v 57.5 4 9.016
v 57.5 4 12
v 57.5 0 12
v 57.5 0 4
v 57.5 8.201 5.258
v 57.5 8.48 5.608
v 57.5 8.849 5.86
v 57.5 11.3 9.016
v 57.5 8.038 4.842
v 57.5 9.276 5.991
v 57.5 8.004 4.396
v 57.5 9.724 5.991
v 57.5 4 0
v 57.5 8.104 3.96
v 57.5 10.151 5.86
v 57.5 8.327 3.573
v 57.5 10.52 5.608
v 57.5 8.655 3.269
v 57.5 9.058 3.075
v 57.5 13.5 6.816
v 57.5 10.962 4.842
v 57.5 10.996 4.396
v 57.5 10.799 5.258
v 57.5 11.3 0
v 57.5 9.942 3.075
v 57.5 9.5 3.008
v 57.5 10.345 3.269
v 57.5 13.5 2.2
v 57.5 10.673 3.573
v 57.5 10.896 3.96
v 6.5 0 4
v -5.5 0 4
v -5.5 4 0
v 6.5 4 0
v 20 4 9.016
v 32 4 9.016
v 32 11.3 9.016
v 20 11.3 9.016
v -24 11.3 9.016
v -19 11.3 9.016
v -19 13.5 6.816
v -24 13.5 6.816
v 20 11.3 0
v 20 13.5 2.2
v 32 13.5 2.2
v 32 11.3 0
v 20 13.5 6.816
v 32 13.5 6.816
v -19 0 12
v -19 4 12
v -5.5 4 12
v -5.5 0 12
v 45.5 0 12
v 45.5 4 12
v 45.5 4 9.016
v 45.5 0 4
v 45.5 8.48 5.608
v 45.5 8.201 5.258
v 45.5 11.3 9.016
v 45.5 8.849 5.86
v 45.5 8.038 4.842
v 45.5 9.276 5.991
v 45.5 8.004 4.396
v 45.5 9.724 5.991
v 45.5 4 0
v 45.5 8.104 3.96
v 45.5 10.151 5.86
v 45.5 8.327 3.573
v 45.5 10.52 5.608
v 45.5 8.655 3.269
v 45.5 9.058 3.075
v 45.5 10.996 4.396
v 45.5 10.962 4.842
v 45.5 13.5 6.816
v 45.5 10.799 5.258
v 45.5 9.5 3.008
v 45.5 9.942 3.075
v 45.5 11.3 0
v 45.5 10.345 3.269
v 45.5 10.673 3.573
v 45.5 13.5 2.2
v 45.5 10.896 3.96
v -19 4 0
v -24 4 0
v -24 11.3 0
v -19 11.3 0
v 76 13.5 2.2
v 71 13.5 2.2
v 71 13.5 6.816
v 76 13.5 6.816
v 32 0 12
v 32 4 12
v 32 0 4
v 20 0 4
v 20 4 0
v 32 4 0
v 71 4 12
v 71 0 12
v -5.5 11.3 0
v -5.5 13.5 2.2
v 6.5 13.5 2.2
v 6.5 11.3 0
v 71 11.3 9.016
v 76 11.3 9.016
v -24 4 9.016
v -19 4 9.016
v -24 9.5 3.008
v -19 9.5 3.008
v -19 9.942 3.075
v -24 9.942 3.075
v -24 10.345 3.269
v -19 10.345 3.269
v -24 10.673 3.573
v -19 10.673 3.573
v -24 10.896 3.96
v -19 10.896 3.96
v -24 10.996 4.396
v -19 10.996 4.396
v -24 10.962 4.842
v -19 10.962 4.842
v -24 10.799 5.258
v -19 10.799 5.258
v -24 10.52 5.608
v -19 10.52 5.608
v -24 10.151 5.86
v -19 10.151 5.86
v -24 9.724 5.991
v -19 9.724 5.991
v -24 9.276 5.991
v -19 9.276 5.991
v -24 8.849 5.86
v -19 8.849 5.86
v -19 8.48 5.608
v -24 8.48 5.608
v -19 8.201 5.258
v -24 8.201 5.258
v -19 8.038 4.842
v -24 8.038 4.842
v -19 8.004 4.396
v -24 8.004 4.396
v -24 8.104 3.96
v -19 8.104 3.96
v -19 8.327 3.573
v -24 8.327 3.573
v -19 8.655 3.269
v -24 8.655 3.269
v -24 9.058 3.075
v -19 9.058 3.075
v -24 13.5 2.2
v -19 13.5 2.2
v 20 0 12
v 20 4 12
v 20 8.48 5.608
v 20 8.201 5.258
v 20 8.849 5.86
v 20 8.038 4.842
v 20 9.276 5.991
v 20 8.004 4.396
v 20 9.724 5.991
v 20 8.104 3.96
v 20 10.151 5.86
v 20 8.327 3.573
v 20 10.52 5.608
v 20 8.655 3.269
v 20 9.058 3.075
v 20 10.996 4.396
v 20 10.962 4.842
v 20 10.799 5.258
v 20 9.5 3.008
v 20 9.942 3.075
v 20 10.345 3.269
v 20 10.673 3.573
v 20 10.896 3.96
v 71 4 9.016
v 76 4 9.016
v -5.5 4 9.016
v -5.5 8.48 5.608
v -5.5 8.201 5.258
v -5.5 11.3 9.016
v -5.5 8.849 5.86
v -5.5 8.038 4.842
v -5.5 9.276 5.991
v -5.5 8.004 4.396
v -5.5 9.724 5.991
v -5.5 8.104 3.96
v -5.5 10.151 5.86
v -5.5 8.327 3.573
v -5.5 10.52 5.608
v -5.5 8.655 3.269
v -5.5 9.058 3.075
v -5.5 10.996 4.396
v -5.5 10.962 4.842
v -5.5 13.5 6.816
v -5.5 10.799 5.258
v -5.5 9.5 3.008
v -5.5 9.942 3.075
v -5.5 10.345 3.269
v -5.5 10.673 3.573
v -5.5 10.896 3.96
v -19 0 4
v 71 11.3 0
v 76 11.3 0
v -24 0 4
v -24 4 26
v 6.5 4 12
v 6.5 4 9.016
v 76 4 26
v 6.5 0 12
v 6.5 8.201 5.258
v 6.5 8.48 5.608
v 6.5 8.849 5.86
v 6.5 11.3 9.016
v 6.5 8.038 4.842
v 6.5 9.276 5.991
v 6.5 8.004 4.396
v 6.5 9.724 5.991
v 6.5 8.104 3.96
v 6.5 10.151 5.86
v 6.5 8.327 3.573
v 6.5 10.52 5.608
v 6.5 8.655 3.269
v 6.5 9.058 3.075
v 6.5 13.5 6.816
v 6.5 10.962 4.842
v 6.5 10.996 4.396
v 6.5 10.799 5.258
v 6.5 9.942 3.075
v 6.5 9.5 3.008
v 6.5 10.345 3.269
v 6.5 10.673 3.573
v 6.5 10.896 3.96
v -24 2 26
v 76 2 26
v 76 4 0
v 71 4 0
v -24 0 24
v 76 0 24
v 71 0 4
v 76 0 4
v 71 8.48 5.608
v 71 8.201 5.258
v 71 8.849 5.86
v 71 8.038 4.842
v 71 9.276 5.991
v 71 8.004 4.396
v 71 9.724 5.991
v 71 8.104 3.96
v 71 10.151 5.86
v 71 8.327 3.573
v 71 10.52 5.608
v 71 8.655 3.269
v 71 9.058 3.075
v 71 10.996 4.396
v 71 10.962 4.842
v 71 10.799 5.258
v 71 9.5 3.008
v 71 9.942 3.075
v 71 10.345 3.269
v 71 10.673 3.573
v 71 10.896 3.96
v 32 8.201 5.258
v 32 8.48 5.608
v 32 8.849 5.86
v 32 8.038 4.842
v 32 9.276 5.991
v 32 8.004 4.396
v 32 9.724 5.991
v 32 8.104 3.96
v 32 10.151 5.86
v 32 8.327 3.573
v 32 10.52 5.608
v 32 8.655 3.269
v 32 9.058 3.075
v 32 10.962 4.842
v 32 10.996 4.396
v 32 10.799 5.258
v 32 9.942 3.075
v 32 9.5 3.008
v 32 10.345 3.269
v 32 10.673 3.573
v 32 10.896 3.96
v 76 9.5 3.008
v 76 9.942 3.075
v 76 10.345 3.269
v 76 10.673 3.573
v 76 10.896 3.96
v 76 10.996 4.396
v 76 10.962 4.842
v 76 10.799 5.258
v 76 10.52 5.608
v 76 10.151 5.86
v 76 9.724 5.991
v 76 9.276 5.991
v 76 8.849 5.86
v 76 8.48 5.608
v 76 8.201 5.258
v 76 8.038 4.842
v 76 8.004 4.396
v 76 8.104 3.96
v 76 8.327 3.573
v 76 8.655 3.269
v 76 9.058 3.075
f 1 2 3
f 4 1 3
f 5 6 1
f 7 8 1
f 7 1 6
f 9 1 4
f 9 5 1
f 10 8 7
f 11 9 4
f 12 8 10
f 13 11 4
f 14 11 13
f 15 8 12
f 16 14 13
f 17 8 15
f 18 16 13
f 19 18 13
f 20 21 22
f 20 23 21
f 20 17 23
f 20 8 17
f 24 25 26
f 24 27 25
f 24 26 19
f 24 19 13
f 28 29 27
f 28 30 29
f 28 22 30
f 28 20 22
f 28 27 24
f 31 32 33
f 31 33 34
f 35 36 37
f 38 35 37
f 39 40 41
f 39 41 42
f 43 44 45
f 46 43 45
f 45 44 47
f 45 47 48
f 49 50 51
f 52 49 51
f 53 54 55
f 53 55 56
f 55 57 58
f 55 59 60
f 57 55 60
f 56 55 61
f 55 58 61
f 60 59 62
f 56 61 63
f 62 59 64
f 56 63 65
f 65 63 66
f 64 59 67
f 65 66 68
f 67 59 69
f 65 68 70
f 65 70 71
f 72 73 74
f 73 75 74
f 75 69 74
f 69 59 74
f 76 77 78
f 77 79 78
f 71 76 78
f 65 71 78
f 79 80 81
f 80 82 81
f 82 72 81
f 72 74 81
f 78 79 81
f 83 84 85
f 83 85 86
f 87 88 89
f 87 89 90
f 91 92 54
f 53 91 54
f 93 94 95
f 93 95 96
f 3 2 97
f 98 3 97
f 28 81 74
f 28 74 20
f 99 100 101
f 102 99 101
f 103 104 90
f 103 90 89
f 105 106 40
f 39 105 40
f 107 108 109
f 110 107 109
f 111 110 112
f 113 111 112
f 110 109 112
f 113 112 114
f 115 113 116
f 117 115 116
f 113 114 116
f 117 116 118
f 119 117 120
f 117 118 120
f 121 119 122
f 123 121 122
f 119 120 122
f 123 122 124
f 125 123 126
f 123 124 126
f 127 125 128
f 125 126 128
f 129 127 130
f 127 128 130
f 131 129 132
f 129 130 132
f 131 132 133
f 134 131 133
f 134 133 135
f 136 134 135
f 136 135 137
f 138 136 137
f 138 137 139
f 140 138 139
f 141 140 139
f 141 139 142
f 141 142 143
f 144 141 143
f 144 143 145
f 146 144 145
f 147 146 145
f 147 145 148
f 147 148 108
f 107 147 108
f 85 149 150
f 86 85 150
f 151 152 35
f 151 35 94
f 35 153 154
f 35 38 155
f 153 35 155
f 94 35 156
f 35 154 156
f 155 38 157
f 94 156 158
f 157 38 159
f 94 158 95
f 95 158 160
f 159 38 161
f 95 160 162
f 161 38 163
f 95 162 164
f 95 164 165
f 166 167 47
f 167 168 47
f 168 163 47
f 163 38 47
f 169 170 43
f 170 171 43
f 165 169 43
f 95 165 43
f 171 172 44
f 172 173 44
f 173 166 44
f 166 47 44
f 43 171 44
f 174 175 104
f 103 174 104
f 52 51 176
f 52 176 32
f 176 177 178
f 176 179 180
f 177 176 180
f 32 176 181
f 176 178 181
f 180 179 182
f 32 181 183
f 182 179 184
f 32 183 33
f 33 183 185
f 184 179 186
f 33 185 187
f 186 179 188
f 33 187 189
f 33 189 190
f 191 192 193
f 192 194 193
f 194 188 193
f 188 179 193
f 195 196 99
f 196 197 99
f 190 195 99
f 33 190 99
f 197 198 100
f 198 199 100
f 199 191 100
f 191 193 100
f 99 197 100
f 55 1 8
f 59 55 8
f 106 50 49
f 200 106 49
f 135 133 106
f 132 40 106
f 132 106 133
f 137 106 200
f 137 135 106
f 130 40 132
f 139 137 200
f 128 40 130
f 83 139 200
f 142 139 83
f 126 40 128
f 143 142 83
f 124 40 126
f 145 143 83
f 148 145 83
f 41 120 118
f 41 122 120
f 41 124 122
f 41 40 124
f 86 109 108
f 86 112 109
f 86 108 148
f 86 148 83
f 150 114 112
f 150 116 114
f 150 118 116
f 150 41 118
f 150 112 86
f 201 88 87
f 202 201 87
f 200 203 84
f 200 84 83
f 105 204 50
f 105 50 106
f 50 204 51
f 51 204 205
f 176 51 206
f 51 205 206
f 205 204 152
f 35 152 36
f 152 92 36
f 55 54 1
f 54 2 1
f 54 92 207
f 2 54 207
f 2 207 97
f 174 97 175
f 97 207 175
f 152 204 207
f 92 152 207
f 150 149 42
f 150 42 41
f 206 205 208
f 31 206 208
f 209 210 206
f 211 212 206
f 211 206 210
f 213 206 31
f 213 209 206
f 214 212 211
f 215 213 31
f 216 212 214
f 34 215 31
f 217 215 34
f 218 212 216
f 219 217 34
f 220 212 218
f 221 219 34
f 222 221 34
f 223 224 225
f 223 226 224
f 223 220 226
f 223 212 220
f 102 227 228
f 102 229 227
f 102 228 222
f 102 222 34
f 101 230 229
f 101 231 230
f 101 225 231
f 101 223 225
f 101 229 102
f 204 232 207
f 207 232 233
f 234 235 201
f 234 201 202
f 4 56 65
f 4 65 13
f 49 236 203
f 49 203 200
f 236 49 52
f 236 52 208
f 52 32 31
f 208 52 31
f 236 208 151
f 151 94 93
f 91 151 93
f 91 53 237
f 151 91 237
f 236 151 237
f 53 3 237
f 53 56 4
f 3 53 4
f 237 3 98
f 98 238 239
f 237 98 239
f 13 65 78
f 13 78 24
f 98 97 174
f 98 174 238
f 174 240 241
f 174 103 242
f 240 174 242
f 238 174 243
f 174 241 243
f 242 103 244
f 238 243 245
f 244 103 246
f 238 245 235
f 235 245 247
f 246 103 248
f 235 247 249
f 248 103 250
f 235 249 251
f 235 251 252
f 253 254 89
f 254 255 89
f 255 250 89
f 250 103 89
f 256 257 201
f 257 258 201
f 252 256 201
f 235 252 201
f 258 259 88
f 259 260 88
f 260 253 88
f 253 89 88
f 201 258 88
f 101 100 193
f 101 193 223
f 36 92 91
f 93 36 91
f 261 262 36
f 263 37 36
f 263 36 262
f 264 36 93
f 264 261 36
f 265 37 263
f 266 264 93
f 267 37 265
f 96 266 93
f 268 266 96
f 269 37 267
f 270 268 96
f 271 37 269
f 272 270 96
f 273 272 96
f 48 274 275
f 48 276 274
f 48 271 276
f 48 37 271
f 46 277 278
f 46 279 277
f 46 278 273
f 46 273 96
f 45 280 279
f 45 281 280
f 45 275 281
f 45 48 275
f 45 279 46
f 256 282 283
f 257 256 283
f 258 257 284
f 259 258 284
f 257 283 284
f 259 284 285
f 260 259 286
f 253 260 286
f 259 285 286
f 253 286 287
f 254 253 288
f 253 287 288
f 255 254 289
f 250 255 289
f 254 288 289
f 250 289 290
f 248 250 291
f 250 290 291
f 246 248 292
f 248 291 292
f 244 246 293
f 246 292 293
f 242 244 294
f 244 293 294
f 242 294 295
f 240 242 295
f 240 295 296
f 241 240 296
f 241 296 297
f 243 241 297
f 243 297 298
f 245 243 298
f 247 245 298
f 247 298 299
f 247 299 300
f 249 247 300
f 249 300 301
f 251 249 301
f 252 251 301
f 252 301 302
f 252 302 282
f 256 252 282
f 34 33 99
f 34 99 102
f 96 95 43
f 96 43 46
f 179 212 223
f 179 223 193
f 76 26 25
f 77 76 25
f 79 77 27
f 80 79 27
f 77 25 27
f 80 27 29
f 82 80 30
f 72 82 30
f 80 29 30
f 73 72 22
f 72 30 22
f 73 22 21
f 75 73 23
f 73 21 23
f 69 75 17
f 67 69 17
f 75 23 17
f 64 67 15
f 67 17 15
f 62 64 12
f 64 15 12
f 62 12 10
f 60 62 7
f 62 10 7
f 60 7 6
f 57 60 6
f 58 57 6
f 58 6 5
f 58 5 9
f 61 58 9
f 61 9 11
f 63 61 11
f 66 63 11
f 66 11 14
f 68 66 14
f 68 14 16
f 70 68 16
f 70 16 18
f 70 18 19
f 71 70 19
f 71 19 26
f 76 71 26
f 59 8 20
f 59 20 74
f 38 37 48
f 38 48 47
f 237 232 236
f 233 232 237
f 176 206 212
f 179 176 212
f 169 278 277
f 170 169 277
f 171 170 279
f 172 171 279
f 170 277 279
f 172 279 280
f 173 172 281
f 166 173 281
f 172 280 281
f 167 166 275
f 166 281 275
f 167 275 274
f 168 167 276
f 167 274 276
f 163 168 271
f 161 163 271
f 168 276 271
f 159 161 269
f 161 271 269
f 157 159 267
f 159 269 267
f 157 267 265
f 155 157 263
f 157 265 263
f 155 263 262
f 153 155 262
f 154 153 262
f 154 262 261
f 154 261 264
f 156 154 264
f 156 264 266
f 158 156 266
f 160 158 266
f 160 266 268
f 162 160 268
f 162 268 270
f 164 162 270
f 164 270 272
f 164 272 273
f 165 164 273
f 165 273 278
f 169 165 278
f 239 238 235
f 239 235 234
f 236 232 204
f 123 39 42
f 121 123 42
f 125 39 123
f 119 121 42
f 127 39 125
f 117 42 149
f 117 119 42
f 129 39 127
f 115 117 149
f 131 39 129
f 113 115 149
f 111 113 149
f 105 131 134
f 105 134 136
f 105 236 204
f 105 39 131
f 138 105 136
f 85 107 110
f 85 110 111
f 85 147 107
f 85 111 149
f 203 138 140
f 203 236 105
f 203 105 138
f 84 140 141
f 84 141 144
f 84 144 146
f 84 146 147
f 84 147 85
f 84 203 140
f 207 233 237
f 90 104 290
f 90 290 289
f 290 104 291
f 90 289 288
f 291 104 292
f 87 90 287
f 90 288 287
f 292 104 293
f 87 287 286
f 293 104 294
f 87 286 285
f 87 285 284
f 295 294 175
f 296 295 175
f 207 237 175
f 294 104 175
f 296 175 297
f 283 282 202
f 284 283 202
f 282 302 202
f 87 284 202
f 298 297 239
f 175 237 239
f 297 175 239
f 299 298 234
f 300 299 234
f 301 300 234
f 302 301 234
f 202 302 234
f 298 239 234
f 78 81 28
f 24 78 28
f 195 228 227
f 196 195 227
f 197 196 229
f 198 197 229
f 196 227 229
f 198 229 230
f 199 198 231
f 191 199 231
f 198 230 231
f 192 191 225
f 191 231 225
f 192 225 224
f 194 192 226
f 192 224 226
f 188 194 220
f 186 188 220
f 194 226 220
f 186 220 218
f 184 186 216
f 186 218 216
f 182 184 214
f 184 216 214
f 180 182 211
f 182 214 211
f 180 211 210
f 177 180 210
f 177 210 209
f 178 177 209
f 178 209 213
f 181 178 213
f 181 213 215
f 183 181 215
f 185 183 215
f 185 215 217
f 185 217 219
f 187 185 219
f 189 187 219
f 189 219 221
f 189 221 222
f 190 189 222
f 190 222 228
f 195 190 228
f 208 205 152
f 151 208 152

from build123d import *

# Parameters (mm, degrees)
SKETCH_1_W          = 100
SKETCH_1_H          = 26
EXTRUDE_1_DEPTH     = 13.5
SKETCH_2_W          = 19.106704299
SKETCH_2_H          = 9.5
CUT_EXTRUDE_1_DEPTH = 105.202927022
CHAMFER_1_SIZE      = 2.2
CHAMFER_2_SIZE      = 4
SKETCH_3_R          = 1.5
CUT_EXTRUDE_2_DEPTH = 105.202927022
SKETCH_4_W          = 13.5
SKETCH_4_H          = 12
CUT_EXTRUDE_3_DEPTH = 82.450905458
CHAMFER_3_SIZE      = 2


with BuildPart() as part:
    # Эскиз1 → Вытянуть1 (new body)
    with BuildSketch(Plane(origin=(0, 0, 0), x_dir=(1, 0, 0), z_dir=(0, 1, 0))):
        with Locations((26, -13)):
            Rectangle(SKETCH_1_W, SKETCH_1_H)
    extrude(amount=EXTRUDE_1_DEPTH)

    # Эскиз2 → Вырез-Вытянуть1 (cut, through all)
    with BuildSketch(Plane(origin=(76, 0, 0), x_dir=(0, 0, -1), z_dir=(1, 0, 0))):
        with Locations((-18.569613205, 8.75)):
            Rectangle(SKETCH_2_W, SKETCH_2_H)
    extrude(amount=-CUT_EXTRUDE_1_DEPTH, mode=Mode.SUBTRACT)

    # Фаска1
    chamfer_1_edges = [part.edges().sort_by_distance(p)[0] for p in [
        (26, 13.5, 0),
        (26, 13.5, 9.016261055),
    ]]
    chamfer(chamfer_1_edges, length=CHAMFER_1_SIZE)

    # Фаска2
    chamfer_2_edges = [part.edges().sort_by_distance(p)[0] for p in [
        (26, 0, 0),
    ]]
    chamfer(chamfer_2_edges, length=CHAMFER_2_SIZE)

    # Эскиз3 → Вырез-Вытянуть2 (cut, through all)
    with BuildSketch(Plane(origin=(76, 0, 0), x_dir=(0, 0, -1), z_dir=(1, 0, 0))):
        with Locations((-4.508130527, 9.5)):
            Circle(SKETCH_3_R)
    extrude(amount=-CUT_EXTRUDE_2_DEPTH, mode=Mode.SUBTRACT)

    # Эскиз4 → Вырез-Вытянуть3 (cut, through all)
    with BuildSketch(Plane(origin=(0, 13.5, 0), x_dir=(1, 0, 0), z_dir=(0, 1, 0))):
        with Locations((-12.25, -6)):
            Rectangle(SKETCH_4_W, SKETCH_4_H)
        with Locations((64.25, -6)):
            Rectangle(SKETCH_4_W, SKETCH_4_H)
        with Locations((13.25, -6)):
            Rectangle(SKETCH_4_W, SKETCH_4_H)
        with Locations((38.75, -6)):
            Rectangle(SKETCH_4_W, SKETCH_4_H)
    extrude(amount=-CUT_EXTRUDE_3_DEPTH, mode=Mode.SUBTRACT)

    # Фаска3
    chamfer_3_edges = [part.edges().sort_by_distance(p)[0] for p in [
        (26, 0, 26),
    ]]
    chamfer(chamfer_3_edges, length=CHAMFER_3_SIZE)


solid = part.part
